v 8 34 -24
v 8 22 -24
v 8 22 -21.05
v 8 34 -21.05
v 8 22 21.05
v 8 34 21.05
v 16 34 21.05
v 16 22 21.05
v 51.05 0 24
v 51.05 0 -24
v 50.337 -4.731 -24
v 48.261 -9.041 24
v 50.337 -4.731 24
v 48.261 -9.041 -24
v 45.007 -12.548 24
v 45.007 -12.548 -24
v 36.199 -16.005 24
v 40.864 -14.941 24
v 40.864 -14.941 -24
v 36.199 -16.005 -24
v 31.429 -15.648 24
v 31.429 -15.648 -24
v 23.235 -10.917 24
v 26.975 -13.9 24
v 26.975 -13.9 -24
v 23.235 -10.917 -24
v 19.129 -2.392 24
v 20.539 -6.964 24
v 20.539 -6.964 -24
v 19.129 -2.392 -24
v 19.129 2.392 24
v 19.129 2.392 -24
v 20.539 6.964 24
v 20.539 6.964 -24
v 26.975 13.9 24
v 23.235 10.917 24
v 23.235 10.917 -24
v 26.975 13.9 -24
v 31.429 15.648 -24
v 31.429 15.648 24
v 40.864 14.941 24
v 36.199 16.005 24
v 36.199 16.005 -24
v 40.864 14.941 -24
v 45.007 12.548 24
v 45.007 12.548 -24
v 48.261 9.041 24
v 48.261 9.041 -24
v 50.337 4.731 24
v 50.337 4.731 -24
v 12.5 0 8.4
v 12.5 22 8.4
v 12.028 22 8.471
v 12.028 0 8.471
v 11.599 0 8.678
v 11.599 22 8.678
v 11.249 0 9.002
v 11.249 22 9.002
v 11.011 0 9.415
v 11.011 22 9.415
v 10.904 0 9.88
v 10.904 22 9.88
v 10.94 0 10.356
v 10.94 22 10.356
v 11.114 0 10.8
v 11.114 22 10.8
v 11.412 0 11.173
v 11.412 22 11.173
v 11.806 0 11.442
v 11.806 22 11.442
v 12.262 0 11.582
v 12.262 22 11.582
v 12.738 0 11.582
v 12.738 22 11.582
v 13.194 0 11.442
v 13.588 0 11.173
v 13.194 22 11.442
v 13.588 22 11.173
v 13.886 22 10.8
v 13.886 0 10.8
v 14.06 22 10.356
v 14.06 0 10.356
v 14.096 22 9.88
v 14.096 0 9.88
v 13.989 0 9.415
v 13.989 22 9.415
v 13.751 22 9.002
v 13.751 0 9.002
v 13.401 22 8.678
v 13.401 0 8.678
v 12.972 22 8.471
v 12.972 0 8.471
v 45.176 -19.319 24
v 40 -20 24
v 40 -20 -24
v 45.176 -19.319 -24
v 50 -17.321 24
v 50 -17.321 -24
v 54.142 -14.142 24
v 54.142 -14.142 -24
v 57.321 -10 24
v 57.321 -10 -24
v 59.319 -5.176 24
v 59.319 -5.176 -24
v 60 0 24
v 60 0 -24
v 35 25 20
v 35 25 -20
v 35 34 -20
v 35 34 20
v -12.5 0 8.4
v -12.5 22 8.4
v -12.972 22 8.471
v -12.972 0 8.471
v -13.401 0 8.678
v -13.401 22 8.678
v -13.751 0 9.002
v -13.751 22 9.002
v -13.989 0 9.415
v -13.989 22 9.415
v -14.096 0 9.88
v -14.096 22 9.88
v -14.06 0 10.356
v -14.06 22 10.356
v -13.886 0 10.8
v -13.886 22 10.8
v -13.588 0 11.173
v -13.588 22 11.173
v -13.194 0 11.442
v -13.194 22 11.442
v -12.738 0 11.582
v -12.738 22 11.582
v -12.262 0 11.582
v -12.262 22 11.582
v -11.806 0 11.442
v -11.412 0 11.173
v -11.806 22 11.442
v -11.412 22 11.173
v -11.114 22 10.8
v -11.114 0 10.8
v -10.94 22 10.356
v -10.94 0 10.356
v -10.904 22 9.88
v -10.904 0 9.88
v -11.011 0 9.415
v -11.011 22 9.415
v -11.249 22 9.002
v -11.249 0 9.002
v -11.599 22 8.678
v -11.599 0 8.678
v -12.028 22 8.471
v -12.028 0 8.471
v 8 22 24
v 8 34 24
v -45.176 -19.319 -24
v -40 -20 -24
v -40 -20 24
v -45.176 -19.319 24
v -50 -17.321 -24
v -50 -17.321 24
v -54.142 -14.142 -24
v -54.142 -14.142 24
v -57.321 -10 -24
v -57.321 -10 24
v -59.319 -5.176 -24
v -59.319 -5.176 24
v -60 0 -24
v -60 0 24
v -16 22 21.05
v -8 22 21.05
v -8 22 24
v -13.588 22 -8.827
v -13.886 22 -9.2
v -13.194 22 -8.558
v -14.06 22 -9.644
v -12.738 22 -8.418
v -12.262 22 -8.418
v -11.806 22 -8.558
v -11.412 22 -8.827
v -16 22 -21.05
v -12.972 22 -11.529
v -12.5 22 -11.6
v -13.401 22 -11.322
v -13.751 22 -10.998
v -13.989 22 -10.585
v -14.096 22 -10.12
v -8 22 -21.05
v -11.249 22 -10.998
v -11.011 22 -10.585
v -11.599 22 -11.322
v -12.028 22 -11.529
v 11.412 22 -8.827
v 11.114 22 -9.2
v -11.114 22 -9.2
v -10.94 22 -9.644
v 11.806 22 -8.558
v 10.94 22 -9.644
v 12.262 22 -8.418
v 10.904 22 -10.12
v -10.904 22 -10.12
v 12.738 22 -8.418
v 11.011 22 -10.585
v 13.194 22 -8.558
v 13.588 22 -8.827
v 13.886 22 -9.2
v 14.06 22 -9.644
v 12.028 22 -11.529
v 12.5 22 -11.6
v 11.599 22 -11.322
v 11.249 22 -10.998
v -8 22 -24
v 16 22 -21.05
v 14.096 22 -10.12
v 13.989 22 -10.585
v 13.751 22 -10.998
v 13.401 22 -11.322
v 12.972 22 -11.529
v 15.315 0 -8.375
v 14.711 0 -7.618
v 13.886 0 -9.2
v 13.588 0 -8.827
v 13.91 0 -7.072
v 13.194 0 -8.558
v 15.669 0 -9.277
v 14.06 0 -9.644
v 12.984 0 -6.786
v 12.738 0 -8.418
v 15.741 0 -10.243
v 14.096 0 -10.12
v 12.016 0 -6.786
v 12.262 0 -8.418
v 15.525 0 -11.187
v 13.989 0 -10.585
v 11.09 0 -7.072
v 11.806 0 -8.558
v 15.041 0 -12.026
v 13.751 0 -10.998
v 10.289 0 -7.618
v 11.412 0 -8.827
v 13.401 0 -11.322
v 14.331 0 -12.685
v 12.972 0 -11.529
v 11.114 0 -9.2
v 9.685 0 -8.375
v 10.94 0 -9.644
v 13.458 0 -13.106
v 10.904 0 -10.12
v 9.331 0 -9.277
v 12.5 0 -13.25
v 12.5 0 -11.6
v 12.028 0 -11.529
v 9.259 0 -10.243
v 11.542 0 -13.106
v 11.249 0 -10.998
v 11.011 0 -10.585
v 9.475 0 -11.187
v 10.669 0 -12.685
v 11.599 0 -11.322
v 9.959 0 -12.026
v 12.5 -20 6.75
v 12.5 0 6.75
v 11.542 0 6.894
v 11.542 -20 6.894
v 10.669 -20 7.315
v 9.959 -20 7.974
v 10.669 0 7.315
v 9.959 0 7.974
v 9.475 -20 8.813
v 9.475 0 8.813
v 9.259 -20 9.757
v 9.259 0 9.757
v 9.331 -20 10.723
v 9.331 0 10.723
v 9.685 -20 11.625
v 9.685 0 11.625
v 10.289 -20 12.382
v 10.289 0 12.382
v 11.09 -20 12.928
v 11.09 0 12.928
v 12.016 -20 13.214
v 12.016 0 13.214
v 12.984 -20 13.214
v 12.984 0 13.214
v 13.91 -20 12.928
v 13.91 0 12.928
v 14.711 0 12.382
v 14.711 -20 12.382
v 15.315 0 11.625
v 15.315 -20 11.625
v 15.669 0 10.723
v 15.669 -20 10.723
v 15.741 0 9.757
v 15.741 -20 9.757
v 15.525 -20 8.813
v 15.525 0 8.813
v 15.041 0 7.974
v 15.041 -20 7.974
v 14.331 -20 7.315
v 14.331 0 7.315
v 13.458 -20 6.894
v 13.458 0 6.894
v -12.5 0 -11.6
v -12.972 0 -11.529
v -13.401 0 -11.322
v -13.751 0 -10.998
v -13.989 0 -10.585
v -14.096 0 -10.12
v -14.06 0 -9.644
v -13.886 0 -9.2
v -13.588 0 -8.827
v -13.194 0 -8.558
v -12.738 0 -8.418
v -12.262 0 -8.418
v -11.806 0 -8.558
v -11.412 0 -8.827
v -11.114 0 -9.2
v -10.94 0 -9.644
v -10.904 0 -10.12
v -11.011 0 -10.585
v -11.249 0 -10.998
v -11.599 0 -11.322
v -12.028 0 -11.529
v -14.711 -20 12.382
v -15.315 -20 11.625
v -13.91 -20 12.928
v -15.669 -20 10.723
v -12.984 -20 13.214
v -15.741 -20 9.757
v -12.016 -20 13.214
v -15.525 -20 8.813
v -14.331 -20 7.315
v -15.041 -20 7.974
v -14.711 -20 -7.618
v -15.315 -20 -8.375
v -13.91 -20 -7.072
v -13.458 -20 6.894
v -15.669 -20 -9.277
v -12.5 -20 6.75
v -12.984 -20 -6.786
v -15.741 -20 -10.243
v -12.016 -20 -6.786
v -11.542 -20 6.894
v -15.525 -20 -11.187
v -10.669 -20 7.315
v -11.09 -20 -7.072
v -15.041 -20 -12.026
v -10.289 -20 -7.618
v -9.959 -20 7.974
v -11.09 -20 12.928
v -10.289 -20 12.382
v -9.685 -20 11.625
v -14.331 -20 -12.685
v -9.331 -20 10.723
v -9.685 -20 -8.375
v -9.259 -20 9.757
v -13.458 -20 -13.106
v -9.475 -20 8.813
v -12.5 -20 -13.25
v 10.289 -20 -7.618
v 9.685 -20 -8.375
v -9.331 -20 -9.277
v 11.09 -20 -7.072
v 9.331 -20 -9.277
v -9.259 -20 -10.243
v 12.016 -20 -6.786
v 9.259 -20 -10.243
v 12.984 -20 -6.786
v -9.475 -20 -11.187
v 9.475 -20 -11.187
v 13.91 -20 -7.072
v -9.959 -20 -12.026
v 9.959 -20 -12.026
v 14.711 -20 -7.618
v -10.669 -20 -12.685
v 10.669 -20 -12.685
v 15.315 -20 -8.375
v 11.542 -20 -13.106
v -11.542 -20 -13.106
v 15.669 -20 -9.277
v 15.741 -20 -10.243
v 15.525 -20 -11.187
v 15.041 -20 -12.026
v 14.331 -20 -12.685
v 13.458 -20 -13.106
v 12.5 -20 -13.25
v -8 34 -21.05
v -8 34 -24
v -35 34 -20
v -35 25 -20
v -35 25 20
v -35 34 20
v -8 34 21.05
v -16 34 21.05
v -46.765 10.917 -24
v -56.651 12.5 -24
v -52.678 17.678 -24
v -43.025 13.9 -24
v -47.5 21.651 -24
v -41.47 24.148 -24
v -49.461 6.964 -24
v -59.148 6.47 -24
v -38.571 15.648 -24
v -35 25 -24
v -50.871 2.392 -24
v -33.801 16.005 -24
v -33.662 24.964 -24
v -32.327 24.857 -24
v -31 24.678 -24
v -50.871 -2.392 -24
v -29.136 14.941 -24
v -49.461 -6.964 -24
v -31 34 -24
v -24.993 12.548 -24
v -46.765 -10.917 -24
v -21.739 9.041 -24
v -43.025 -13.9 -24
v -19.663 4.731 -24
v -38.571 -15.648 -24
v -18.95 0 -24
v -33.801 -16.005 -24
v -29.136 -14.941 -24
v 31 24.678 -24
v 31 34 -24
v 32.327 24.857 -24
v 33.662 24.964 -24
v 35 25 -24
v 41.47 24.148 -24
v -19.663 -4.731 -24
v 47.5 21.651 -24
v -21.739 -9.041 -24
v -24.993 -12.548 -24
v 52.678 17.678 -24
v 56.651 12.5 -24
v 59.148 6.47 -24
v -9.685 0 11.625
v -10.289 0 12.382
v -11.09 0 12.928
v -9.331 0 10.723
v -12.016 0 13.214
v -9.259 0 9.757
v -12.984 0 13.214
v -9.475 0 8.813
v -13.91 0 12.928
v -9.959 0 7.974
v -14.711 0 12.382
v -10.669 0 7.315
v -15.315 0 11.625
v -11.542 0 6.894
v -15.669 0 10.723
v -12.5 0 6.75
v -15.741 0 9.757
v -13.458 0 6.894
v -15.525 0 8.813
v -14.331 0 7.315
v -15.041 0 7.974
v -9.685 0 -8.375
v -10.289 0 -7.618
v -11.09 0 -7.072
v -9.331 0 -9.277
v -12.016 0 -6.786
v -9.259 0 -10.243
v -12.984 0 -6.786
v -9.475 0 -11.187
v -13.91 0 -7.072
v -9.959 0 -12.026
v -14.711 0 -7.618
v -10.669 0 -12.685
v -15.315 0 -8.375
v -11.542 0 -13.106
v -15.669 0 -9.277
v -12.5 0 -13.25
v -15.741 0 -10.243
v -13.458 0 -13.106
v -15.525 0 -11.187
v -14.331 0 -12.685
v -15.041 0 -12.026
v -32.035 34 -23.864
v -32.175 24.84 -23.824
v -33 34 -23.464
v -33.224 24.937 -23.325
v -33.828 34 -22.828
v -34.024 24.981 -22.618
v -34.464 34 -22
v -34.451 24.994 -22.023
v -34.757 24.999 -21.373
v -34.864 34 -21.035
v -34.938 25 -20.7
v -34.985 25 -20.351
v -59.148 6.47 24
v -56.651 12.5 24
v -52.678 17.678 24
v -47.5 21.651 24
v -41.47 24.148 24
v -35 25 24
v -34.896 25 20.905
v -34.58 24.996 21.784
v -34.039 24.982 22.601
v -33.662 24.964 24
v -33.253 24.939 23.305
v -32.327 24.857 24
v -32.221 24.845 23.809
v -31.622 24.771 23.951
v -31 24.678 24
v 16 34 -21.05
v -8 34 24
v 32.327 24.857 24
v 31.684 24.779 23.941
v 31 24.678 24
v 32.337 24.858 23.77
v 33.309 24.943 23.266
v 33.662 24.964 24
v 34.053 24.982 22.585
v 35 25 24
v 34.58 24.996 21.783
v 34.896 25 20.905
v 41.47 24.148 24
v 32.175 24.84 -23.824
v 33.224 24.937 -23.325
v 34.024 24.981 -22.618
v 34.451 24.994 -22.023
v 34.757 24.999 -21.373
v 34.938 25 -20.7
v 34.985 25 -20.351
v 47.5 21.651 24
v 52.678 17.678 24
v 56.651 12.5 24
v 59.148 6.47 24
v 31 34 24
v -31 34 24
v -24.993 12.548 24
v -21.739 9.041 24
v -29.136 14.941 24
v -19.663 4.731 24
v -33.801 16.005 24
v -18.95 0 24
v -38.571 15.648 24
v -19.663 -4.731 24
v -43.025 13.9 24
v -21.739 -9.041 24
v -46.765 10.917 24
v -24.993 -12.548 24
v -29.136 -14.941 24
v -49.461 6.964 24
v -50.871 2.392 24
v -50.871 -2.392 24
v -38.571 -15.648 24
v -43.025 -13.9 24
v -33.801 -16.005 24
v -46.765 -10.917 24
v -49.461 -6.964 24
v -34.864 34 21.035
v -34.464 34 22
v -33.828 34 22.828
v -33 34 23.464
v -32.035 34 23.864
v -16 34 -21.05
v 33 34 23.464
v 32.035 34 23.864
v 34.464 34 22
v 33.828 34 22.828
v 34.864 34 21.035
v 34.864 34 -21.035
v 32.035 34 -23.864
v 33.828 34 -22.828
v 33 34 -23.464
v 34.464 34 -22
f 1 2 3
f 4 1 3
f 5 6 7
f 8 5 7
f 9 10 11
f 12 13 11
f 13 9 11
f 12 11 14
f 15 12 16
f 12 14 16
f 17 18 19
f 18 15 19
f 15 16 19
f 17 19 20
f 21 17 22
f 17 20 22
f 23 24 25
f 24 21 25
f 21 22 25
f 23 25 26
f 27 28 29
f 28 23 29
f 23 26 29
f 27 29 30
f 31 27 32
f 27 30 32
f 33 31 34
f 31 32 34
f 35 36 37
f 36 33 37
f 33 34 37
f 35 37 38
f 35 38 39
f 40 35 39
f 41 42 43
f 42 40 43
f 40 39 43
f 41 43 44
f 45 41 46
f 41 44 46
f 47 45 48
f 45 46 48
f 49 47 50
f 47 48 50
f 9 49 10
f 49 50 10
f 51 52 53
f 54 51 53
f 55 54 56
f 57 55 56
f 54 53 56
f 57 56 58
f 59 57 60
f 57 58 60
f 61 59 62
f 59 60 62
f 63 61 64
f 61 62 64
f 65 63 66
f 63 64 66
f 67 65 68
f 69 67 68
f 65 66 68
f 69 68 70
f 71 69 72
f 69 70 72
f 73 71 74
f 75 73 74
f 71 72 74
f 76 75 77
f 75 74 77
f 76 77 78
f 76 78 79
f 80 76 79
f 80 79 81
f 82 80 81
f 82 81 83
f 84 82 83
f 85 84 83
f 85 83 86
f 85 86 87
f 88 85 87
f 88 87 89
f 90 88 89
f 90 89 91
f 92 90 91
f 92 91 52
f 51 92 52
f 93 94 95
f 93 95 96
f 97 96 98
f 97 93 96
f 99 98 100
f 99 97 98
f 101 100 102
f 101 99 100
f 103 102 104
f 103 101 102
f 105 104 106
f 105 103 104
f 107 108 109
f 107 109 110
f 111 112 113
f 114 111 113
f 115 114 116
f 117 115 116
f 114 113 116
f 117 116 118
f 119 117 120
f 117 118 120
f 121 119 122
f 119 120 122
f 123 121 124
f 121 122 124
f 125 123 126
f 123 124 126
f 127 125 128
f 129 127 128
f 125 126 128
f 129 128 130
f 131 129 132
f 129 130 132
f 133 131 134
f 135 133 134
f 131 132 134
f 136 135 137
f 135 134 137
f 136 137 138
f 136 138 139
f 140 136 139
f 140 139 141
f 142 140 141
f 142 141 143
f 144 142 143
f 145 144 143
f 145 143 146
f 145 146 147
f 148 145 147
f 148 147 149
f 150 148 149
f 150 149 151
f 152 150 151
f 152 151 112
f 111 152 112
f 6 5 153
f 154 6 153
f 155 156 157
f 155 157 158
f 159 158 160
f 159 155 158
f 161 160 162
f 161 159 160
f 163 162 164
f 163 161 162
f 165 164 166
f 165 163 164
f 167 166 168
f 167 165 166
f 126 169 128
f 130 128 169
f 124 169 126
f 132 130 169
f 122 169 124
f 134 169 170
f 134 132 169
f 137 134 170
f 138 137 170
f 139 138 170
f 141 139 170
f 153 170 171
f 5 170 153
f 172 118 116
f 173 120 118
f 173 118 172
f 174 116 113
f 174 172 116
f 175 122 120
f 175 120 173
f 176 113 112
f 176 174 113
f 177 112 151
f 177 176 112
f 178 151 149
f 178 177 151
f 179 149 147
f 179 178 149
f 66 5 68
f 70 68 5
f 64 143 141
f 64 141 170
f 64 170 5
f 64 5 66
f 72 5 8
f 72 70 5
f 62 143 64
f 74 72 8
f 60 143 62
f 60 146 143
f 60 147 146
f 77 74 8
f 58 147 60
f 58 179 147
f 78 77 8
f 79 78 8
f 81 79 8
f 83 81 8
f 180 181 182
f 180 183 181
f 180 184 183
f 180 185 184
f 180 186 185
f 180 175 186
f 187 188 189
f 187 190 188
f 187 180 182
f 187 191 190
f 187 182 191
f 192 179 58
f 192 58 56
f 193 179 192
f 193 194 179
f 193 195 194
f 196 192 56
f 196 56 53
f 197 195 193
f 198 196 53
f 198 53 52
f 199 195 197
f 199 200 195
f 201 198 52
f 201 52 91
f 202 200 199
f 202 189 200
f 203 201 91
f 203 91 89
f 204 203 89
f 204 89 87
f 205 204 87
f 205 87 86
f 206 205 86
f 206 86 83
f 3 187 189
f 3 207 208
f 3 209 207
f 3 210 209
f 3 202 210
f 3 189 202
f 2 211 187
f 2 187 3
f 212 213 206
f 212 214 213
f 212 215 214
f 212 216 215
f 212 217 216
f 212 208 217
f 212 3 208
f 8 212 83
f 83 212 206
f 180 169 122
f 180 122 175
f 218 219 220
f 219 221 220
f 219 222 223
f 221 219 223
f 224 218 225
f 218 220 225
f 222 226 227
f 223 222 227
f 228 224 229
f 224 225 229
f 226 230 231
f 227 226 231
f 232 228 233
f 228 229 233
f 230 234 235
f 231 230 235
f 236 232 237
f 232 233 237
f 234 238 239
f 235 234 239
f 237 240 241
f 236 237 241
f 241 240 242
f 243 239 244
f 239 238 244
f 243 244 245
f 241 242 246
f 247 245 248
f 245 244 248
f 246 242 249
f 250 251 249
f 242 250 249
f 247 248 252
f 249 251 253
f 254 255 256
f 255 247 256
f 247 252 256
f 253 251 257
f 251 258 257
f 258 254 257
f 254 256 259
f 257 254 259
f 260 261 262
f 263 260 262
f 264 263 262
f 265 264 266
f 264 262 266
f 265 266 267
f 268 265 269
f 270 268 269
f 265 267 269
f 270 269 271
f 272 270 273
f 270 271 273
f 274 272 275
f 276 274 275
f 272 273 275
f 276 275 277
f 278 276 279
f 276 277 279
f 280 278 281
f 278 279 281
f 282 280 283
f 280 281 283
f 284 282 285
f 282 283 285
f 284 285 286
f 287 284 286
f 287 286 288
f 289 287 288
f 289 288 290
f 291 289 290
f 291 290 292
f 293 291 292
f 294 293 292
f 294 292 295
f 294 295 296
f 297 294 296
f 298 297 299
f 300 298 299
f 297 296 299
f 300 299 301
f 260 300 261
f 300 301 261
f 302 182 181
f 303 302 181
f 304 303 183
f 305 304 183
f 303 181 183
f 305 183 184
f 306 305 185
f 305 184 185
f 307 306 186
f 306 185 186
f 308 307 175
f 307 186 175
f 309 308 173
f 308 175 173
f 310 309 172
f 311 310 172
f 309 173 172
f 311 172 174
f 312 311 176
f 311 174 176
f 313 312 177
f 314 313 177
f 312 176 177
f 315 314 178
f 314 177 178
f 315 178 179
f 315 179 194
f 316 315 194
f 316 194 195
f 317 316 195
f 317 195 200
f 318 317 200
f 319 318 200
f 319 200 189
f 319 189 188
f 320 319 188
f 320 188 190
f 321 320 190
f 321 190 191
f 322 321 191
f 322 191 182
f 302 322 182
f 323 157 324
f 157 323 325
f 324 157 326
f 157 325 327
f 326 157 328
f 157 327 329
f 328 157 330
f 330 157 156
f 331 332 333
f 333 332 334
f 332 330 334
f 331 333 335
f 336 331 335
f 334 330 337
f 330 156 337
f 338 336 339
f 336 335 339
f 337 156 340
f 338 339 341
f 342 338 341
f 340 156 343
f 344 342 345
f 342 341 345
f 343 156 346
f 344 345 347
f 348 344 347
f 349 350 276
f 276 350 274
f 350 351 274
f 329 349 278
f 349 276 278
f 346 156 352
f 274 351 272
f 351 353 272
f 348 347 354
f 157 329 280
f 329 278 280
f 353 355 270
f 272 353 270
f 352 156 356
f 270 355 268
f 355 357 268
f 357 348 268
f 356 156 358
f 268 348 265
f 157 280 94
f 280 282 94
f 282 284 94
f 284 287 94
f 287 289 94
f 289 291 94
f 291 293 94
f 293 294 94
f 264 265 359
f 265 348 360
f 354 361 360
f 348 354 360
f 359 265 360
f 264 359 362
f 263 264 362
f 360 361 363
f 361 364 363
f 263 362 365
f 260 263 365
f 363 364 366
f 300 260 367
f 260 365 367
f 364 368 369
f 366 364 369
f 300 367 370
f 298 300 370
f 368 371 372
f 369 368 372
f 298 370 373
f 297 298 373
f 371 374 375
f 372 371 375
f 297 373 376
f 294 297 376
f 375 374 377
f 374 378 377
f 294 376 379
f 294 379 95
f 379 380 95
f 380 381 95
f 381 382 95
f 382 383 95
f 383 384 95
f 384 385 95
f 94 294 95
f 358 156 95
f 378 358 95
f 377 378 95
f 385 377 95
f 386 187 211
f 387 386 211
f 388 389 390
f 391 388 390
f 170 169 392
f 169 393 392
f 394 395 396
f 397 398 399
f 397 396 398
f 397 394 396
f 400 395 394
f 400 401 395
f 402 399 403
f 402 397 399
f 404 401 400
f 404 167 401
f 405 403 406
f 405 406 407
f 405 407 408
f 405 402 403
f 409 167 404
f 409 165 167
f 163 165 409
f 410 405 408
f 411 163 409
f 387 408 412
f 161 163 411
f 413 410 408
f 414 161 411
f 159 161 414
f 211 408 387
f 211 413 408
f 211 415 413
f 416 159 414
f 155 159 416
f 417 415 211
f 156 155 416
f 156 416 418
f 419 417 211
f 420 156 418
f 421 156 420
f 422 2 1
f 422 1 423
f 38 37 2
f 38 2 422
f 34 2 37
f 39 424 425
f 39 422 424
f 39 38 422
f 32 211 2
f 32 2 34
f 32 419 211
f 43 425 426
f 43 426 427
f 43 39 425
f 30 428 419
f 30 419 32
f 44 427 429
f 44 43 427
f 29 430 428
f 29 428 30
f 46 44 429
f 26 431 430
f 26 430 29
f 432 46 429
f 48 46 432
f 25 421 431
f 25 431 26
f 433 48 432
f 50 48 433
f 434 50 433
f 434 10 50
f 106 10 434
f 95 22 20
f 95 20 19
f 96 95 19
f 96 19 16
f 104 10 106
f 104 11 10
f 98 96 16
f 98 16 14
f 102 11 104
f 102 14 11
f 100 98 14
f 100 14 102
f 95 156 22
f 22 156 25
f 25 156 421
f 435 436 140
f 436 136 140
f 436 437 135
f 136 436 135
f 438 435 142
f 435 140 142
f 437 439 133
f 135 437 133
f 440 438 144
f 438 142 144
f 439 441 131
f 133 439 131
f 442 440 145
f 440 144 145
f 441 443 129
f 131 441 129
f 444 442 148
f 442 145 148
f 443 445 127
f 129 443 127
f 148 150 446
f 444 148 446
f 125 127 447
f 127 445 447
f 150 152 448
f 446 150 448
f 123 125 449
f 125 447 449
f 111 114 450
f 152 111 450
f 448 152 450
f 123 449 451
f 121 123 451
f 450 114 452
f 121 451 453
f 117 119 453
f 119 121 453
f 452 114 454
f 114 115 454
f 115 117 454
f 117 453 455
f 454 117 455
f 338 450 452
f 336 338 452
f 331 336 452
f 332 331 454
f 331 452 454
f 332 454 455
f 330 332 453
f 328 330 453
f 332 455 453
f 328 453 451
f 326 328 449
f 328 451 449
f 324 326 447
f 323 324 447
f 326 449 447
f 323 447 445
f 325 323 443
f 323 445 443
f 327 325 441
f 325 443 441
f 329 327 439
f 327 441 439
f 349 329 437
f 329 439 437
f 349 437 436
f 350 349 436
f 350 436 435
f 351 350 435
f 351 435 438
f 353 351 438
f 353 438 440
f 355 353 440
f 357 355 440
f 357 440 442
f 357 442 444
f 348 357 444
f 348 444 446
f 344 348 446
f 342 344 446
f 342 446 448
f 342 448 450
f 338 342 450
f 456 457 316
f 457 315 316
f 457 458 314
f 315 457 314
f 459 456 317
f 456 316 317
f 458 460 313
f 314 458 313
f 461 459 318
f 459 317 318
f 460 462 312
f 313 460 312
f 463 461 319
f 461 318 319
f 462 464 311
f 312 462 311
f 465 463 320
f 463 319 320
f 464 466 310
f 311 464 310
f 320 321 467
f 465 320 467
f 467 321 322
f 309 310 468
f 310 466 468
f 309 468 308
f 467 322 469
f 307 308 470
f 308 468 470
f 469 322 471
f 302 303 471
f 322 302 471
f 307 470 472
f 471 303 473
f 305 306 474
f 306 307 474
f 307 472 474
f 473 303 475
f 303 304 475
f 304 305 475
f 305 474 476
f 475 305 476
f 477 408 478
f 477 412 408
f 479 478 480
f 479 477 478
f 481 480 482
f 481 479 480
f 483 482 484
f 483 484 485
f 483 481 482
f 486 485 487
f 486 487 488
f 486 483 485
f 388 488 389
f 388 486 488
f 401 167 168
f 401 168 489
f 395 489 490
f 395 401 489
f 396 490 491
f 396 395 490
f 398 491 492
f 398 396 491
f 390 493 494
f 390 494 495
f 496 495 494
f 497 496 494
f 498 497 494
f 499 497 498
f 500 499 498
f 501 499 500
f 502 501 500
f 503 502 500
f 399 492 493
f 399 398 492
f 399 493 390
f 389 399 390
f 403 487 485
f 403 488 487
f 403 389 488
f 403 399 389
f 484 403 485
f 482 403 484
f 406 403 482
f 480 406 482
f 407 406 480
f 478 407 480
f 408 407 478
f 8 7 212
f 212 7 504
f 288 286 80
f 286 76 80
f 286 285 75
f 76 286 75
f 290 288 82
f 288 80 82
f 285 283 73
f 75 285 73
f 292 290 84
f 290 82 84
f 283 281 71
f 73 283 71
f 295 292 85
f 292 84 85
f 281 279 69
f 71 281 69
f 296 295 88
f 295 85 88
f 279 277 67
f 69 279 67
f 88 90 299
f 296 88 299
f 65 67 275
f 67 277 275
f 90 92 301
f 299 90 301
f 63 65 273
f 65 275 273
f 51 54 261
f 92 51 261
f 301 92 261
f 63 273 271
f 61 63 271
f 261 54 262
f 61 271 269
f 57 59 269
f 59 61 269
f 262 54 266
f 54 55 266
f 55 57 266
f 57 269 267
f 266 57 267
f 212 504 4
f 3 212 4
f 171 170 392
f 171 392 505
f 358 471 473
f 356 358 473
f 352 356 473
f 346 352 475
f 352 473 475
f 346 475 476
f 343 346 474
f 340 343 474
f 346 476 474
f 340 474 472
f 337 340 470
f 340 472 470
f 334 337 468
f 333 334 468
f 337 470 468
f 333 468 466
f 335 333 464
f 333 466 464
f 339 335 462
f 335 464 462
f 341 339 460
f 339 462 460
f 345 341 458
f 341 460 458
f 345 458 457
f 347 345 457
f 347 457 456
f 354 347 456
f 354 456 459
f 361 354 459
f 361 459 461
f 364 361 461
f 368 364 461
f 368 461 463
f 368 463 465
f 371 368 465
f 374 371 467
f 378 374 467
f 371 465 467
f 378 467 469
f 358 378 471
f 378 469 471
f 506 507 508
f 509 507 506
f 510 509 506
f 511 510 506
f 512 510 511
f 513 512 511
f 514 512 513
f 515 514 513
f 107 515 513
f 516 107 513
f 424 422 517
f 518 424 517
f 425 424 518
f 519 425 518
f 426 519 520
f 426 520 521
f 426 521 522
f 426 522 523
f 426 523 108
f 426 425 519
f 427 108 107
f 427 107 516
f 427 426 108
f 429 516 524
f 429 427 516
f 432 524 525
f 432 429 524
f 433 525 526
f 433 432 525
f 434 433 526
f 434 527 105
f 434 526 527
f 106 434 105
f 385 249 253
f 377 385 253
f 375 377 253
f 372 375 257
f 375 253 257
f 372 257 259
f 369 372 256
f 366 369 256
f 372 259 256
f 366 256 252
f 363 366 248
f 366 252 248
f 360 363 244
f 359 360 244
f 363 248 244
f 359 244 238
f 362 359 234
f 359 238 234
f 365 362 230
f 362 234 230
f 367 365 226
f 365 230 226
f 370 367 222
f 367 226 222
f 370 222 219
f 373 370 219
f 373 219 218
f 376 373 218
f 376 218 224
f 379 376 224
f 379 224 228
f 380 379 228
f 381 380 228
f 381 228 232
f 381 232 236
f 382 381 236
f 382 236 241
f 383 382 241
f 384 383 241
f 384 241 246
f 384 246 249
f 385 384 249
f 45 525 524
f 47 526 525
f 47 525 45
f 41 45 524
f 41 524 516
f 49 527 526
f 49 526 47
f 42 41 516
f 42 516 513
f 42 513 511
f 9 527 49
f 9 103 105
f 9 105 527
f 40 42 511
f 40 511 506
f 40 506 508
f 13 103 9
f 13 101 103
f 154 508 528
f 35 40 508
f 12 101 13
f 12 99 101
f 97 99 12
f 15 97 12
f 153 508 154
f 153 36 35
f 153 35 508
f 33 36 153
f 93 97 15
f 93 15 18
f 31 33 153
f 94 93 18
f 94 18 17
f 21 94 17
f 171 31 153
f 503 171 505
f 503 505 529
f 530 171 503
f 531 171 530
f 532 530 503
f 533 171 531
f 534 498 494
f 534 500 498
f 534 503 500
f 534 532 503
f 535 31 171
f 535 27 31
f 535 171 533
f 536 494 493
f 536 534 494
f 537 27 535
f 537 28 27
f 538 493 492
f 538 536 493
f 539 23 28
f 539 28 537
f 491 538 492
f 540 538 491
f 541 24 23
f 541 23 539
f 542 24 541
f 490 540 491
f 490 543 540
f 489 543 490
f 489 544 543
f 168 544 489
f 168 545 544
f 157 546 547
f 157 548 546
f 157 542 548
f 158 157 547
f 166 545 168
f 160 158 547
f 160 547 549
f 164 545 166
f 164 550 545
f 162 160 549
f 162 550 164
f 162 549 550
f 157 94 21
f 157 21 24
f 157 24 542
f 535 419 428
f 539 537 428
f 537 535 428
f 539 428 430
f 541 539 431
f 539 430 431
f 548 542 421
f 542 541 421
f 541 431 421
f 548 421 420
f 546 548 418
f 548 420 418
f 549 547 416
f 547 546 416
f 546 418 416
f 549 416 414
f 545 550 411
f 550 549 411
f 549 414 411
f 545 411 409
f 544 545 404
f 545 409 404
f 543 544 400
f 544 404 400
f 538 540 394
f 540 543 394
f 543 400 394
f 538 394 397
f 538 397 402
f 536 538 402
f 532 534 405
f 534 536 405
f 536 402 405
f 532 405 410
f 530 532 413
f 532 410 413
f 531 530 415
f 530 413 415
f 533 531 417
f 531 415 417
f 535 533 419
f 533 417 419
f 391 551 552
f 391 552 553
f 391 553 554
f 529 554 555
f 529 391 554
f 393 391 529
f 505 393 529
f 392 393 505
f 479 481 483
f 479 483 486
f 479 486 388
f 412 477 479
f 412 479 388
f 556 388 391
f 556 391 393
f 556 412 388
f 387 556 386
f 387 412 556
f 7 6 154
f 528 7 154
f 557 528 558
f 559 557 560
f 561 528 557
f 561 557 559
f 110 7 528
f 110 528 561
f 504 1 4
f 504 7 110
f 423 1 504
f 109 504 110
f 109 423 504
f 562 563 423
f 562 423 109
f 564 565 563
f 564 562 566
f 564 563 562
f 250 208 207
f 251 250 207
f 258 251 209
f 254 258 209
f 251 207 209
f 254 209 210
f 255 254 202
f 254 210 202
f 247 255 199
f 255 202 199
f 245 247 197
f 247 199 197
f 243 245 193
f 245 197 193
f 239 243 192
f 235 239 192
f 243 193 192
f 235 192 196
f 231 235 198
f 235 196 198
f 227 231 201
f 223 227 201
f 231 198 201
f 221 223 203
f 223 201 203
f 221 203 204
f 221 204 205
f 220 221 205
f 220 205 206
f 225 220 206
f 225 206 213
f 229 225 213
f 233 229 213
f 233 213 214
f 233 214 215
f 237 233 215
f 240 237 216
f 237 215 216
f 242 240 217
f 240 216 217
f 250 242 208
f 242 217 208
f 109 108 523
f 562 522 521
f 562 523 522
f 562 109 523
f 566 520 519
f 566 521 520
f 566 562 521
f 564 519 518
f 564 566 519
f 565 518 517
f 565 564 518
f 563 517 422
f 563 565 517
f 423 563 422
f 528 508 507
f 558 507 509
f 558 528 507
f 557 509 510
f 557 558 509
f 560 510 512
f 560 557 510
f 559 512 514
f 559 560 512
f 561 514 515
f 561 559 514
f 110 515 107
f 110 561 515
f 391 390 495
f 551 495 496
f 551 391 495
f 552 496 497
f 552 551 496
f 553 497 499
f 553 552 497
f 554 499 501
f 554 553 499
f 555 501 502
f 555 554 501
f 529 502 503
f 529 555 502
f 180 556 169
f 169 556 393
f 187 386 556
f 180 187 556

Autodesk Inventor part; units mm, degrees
ref_plane "YZ Plane" through (0, 0, 0) normal (1, 0, 0) x (0, 1, 0)
ref_plane "XZ Plane" through (0, 0, 0) normal (0, 1, 0) x (-1, 0, 0)
ref_plane "XY Plane" through (0, 0, 0) normal (0, 0, 1) x (1, 0, 0)
sketch "Sketch1" plane through (0, 0, 0) normal (0, 0, 1) x (1, 0, 0)
  line L0 (-35, 0) -> (35, 0) construction
  circle A0 centre (-35, 0) radius 16.05
  circle A1 centre (35, 0) radius 16.05
  arc A2 (-20, -20) -> (-50, -20) centre (-35, 0) ccw
  arc A3 (50, -20) -> (20, -20) centre (35, 0) ccw
  line L1 (-35, 25) -> (35, 25)
  line L2 (-50, -20) -> (50, -20)
  point P0 (0, 0)
  point P1 (0, 0)
  dimension "d0" = 70
  dimension "d1" = 32.1
  dimension "d3" = 50
  dimension "d38" = 20
extrude "Extrusion1" add sketch "Sketch1" along normal mid plane 48
fillet "Fillet3" radius 20 2 edges at (50, -20, 0) (-50, -20, 0)
sketch "Sketch10" plane through (-35, 25, 24) normal (0, 1, 0) x (1, 0, 0)
  line L0 (0, 48) -> (0, 0) projected
  line L1 (70, 0) -> (0, 0) projected
  line L2 (70, 48) -> (70, 0) projected
  line L3 (0, 48) -> (70, 48) projected
  point P0 (35, 24)
extrude "Extrusion4" add sketch "Sketch10" along normal blind 9
sketch "Sketch11" plane through (-35, 34, 24) normal (0, 1, 0) x (1, 0, 0)
  line L0 (19, 2.95) -> (51, 2.95)
  line L1 (51, 2.95) -> (51, 45.05)
  line L2 (51, 45.05) -> (19, 45.05)
  line L3 (19, 45.05) -> (19, 2.95)
  line L4 (19, 2.95) -> (51, 45.05) construction
  line L5 (51, 2.95) -> (19, 45.05) construction
  line L6 (0, 48) -> (0, 0) projected
  line L7 (0, 0) -> (70, 0) projected
  line L8 (70, 0) -> (70, 48) projected
  line L9 (70, 48) -> (0, 48) projected
  line L10 (27, 48) -> (43, 48)
  line L11 (43, 48) -> (43, 45.05)
  line L12 (43, 45.05) -> (27, 45.05)
  line L13 (27, 45.05) -> (27, 48)
  line L14 (27, 2.95) -> (27, 0)
  line L15 (35, 24) -> (35, 47.5578) construction
  line L16 (43, 2.95) -> (43, 0)
  point P0 (35, 45.05)
  point P1 (43, 0)
  point P2 (43, 2.95)
  dimension "d49" = 32
  dimension "d50" = 42.1
  dimension "d53" = 16
extrude "Extrusion5" cut sketch "Sketch11" against normal blind 12 contours L3 L2 L1 L0 | L0 L16 L7 L14 | L13 L9 L11 L2
sketch "Sketch12" plane through (-40, -20, -24) normal (0, -1, 0) x (1, 0, 0)
  line L0 (27.5, 14) -> (52.5, 14) construction
  line L1 (52.5, 14) -> (52.5, 34) construction
  line L2 (52.5, 34) -> (27.5, 34) construction
  line L3 (27.5, 34) -> (27.5, 14) construction
  line L4 (27.5, 14) -> (52.5, 34) construction
  line L5 (52.5, 14) -> (27.5, 34) construction
  point P0 (40, 24)
  dimension "d54" = 25
  dimension "d55" = 20
hole "Hole4" at (-12.5, -20, 10) at (12.5, -20, 10) at (12.5, -20, -10) at (-12.5, -20, -10) direction (0, 1, 0) diameter 3.2 end through all counterbore diameter 6.5 counterbore depth 20
fillet "Fillet4" radius 4 4 edges at (35, 29.5, 24) (35, 29.5, -24) (-35, 29.5, 24) (-35, 29.5, -24)
properties part number "Space Craft Braket" material "ABS Plastic"
